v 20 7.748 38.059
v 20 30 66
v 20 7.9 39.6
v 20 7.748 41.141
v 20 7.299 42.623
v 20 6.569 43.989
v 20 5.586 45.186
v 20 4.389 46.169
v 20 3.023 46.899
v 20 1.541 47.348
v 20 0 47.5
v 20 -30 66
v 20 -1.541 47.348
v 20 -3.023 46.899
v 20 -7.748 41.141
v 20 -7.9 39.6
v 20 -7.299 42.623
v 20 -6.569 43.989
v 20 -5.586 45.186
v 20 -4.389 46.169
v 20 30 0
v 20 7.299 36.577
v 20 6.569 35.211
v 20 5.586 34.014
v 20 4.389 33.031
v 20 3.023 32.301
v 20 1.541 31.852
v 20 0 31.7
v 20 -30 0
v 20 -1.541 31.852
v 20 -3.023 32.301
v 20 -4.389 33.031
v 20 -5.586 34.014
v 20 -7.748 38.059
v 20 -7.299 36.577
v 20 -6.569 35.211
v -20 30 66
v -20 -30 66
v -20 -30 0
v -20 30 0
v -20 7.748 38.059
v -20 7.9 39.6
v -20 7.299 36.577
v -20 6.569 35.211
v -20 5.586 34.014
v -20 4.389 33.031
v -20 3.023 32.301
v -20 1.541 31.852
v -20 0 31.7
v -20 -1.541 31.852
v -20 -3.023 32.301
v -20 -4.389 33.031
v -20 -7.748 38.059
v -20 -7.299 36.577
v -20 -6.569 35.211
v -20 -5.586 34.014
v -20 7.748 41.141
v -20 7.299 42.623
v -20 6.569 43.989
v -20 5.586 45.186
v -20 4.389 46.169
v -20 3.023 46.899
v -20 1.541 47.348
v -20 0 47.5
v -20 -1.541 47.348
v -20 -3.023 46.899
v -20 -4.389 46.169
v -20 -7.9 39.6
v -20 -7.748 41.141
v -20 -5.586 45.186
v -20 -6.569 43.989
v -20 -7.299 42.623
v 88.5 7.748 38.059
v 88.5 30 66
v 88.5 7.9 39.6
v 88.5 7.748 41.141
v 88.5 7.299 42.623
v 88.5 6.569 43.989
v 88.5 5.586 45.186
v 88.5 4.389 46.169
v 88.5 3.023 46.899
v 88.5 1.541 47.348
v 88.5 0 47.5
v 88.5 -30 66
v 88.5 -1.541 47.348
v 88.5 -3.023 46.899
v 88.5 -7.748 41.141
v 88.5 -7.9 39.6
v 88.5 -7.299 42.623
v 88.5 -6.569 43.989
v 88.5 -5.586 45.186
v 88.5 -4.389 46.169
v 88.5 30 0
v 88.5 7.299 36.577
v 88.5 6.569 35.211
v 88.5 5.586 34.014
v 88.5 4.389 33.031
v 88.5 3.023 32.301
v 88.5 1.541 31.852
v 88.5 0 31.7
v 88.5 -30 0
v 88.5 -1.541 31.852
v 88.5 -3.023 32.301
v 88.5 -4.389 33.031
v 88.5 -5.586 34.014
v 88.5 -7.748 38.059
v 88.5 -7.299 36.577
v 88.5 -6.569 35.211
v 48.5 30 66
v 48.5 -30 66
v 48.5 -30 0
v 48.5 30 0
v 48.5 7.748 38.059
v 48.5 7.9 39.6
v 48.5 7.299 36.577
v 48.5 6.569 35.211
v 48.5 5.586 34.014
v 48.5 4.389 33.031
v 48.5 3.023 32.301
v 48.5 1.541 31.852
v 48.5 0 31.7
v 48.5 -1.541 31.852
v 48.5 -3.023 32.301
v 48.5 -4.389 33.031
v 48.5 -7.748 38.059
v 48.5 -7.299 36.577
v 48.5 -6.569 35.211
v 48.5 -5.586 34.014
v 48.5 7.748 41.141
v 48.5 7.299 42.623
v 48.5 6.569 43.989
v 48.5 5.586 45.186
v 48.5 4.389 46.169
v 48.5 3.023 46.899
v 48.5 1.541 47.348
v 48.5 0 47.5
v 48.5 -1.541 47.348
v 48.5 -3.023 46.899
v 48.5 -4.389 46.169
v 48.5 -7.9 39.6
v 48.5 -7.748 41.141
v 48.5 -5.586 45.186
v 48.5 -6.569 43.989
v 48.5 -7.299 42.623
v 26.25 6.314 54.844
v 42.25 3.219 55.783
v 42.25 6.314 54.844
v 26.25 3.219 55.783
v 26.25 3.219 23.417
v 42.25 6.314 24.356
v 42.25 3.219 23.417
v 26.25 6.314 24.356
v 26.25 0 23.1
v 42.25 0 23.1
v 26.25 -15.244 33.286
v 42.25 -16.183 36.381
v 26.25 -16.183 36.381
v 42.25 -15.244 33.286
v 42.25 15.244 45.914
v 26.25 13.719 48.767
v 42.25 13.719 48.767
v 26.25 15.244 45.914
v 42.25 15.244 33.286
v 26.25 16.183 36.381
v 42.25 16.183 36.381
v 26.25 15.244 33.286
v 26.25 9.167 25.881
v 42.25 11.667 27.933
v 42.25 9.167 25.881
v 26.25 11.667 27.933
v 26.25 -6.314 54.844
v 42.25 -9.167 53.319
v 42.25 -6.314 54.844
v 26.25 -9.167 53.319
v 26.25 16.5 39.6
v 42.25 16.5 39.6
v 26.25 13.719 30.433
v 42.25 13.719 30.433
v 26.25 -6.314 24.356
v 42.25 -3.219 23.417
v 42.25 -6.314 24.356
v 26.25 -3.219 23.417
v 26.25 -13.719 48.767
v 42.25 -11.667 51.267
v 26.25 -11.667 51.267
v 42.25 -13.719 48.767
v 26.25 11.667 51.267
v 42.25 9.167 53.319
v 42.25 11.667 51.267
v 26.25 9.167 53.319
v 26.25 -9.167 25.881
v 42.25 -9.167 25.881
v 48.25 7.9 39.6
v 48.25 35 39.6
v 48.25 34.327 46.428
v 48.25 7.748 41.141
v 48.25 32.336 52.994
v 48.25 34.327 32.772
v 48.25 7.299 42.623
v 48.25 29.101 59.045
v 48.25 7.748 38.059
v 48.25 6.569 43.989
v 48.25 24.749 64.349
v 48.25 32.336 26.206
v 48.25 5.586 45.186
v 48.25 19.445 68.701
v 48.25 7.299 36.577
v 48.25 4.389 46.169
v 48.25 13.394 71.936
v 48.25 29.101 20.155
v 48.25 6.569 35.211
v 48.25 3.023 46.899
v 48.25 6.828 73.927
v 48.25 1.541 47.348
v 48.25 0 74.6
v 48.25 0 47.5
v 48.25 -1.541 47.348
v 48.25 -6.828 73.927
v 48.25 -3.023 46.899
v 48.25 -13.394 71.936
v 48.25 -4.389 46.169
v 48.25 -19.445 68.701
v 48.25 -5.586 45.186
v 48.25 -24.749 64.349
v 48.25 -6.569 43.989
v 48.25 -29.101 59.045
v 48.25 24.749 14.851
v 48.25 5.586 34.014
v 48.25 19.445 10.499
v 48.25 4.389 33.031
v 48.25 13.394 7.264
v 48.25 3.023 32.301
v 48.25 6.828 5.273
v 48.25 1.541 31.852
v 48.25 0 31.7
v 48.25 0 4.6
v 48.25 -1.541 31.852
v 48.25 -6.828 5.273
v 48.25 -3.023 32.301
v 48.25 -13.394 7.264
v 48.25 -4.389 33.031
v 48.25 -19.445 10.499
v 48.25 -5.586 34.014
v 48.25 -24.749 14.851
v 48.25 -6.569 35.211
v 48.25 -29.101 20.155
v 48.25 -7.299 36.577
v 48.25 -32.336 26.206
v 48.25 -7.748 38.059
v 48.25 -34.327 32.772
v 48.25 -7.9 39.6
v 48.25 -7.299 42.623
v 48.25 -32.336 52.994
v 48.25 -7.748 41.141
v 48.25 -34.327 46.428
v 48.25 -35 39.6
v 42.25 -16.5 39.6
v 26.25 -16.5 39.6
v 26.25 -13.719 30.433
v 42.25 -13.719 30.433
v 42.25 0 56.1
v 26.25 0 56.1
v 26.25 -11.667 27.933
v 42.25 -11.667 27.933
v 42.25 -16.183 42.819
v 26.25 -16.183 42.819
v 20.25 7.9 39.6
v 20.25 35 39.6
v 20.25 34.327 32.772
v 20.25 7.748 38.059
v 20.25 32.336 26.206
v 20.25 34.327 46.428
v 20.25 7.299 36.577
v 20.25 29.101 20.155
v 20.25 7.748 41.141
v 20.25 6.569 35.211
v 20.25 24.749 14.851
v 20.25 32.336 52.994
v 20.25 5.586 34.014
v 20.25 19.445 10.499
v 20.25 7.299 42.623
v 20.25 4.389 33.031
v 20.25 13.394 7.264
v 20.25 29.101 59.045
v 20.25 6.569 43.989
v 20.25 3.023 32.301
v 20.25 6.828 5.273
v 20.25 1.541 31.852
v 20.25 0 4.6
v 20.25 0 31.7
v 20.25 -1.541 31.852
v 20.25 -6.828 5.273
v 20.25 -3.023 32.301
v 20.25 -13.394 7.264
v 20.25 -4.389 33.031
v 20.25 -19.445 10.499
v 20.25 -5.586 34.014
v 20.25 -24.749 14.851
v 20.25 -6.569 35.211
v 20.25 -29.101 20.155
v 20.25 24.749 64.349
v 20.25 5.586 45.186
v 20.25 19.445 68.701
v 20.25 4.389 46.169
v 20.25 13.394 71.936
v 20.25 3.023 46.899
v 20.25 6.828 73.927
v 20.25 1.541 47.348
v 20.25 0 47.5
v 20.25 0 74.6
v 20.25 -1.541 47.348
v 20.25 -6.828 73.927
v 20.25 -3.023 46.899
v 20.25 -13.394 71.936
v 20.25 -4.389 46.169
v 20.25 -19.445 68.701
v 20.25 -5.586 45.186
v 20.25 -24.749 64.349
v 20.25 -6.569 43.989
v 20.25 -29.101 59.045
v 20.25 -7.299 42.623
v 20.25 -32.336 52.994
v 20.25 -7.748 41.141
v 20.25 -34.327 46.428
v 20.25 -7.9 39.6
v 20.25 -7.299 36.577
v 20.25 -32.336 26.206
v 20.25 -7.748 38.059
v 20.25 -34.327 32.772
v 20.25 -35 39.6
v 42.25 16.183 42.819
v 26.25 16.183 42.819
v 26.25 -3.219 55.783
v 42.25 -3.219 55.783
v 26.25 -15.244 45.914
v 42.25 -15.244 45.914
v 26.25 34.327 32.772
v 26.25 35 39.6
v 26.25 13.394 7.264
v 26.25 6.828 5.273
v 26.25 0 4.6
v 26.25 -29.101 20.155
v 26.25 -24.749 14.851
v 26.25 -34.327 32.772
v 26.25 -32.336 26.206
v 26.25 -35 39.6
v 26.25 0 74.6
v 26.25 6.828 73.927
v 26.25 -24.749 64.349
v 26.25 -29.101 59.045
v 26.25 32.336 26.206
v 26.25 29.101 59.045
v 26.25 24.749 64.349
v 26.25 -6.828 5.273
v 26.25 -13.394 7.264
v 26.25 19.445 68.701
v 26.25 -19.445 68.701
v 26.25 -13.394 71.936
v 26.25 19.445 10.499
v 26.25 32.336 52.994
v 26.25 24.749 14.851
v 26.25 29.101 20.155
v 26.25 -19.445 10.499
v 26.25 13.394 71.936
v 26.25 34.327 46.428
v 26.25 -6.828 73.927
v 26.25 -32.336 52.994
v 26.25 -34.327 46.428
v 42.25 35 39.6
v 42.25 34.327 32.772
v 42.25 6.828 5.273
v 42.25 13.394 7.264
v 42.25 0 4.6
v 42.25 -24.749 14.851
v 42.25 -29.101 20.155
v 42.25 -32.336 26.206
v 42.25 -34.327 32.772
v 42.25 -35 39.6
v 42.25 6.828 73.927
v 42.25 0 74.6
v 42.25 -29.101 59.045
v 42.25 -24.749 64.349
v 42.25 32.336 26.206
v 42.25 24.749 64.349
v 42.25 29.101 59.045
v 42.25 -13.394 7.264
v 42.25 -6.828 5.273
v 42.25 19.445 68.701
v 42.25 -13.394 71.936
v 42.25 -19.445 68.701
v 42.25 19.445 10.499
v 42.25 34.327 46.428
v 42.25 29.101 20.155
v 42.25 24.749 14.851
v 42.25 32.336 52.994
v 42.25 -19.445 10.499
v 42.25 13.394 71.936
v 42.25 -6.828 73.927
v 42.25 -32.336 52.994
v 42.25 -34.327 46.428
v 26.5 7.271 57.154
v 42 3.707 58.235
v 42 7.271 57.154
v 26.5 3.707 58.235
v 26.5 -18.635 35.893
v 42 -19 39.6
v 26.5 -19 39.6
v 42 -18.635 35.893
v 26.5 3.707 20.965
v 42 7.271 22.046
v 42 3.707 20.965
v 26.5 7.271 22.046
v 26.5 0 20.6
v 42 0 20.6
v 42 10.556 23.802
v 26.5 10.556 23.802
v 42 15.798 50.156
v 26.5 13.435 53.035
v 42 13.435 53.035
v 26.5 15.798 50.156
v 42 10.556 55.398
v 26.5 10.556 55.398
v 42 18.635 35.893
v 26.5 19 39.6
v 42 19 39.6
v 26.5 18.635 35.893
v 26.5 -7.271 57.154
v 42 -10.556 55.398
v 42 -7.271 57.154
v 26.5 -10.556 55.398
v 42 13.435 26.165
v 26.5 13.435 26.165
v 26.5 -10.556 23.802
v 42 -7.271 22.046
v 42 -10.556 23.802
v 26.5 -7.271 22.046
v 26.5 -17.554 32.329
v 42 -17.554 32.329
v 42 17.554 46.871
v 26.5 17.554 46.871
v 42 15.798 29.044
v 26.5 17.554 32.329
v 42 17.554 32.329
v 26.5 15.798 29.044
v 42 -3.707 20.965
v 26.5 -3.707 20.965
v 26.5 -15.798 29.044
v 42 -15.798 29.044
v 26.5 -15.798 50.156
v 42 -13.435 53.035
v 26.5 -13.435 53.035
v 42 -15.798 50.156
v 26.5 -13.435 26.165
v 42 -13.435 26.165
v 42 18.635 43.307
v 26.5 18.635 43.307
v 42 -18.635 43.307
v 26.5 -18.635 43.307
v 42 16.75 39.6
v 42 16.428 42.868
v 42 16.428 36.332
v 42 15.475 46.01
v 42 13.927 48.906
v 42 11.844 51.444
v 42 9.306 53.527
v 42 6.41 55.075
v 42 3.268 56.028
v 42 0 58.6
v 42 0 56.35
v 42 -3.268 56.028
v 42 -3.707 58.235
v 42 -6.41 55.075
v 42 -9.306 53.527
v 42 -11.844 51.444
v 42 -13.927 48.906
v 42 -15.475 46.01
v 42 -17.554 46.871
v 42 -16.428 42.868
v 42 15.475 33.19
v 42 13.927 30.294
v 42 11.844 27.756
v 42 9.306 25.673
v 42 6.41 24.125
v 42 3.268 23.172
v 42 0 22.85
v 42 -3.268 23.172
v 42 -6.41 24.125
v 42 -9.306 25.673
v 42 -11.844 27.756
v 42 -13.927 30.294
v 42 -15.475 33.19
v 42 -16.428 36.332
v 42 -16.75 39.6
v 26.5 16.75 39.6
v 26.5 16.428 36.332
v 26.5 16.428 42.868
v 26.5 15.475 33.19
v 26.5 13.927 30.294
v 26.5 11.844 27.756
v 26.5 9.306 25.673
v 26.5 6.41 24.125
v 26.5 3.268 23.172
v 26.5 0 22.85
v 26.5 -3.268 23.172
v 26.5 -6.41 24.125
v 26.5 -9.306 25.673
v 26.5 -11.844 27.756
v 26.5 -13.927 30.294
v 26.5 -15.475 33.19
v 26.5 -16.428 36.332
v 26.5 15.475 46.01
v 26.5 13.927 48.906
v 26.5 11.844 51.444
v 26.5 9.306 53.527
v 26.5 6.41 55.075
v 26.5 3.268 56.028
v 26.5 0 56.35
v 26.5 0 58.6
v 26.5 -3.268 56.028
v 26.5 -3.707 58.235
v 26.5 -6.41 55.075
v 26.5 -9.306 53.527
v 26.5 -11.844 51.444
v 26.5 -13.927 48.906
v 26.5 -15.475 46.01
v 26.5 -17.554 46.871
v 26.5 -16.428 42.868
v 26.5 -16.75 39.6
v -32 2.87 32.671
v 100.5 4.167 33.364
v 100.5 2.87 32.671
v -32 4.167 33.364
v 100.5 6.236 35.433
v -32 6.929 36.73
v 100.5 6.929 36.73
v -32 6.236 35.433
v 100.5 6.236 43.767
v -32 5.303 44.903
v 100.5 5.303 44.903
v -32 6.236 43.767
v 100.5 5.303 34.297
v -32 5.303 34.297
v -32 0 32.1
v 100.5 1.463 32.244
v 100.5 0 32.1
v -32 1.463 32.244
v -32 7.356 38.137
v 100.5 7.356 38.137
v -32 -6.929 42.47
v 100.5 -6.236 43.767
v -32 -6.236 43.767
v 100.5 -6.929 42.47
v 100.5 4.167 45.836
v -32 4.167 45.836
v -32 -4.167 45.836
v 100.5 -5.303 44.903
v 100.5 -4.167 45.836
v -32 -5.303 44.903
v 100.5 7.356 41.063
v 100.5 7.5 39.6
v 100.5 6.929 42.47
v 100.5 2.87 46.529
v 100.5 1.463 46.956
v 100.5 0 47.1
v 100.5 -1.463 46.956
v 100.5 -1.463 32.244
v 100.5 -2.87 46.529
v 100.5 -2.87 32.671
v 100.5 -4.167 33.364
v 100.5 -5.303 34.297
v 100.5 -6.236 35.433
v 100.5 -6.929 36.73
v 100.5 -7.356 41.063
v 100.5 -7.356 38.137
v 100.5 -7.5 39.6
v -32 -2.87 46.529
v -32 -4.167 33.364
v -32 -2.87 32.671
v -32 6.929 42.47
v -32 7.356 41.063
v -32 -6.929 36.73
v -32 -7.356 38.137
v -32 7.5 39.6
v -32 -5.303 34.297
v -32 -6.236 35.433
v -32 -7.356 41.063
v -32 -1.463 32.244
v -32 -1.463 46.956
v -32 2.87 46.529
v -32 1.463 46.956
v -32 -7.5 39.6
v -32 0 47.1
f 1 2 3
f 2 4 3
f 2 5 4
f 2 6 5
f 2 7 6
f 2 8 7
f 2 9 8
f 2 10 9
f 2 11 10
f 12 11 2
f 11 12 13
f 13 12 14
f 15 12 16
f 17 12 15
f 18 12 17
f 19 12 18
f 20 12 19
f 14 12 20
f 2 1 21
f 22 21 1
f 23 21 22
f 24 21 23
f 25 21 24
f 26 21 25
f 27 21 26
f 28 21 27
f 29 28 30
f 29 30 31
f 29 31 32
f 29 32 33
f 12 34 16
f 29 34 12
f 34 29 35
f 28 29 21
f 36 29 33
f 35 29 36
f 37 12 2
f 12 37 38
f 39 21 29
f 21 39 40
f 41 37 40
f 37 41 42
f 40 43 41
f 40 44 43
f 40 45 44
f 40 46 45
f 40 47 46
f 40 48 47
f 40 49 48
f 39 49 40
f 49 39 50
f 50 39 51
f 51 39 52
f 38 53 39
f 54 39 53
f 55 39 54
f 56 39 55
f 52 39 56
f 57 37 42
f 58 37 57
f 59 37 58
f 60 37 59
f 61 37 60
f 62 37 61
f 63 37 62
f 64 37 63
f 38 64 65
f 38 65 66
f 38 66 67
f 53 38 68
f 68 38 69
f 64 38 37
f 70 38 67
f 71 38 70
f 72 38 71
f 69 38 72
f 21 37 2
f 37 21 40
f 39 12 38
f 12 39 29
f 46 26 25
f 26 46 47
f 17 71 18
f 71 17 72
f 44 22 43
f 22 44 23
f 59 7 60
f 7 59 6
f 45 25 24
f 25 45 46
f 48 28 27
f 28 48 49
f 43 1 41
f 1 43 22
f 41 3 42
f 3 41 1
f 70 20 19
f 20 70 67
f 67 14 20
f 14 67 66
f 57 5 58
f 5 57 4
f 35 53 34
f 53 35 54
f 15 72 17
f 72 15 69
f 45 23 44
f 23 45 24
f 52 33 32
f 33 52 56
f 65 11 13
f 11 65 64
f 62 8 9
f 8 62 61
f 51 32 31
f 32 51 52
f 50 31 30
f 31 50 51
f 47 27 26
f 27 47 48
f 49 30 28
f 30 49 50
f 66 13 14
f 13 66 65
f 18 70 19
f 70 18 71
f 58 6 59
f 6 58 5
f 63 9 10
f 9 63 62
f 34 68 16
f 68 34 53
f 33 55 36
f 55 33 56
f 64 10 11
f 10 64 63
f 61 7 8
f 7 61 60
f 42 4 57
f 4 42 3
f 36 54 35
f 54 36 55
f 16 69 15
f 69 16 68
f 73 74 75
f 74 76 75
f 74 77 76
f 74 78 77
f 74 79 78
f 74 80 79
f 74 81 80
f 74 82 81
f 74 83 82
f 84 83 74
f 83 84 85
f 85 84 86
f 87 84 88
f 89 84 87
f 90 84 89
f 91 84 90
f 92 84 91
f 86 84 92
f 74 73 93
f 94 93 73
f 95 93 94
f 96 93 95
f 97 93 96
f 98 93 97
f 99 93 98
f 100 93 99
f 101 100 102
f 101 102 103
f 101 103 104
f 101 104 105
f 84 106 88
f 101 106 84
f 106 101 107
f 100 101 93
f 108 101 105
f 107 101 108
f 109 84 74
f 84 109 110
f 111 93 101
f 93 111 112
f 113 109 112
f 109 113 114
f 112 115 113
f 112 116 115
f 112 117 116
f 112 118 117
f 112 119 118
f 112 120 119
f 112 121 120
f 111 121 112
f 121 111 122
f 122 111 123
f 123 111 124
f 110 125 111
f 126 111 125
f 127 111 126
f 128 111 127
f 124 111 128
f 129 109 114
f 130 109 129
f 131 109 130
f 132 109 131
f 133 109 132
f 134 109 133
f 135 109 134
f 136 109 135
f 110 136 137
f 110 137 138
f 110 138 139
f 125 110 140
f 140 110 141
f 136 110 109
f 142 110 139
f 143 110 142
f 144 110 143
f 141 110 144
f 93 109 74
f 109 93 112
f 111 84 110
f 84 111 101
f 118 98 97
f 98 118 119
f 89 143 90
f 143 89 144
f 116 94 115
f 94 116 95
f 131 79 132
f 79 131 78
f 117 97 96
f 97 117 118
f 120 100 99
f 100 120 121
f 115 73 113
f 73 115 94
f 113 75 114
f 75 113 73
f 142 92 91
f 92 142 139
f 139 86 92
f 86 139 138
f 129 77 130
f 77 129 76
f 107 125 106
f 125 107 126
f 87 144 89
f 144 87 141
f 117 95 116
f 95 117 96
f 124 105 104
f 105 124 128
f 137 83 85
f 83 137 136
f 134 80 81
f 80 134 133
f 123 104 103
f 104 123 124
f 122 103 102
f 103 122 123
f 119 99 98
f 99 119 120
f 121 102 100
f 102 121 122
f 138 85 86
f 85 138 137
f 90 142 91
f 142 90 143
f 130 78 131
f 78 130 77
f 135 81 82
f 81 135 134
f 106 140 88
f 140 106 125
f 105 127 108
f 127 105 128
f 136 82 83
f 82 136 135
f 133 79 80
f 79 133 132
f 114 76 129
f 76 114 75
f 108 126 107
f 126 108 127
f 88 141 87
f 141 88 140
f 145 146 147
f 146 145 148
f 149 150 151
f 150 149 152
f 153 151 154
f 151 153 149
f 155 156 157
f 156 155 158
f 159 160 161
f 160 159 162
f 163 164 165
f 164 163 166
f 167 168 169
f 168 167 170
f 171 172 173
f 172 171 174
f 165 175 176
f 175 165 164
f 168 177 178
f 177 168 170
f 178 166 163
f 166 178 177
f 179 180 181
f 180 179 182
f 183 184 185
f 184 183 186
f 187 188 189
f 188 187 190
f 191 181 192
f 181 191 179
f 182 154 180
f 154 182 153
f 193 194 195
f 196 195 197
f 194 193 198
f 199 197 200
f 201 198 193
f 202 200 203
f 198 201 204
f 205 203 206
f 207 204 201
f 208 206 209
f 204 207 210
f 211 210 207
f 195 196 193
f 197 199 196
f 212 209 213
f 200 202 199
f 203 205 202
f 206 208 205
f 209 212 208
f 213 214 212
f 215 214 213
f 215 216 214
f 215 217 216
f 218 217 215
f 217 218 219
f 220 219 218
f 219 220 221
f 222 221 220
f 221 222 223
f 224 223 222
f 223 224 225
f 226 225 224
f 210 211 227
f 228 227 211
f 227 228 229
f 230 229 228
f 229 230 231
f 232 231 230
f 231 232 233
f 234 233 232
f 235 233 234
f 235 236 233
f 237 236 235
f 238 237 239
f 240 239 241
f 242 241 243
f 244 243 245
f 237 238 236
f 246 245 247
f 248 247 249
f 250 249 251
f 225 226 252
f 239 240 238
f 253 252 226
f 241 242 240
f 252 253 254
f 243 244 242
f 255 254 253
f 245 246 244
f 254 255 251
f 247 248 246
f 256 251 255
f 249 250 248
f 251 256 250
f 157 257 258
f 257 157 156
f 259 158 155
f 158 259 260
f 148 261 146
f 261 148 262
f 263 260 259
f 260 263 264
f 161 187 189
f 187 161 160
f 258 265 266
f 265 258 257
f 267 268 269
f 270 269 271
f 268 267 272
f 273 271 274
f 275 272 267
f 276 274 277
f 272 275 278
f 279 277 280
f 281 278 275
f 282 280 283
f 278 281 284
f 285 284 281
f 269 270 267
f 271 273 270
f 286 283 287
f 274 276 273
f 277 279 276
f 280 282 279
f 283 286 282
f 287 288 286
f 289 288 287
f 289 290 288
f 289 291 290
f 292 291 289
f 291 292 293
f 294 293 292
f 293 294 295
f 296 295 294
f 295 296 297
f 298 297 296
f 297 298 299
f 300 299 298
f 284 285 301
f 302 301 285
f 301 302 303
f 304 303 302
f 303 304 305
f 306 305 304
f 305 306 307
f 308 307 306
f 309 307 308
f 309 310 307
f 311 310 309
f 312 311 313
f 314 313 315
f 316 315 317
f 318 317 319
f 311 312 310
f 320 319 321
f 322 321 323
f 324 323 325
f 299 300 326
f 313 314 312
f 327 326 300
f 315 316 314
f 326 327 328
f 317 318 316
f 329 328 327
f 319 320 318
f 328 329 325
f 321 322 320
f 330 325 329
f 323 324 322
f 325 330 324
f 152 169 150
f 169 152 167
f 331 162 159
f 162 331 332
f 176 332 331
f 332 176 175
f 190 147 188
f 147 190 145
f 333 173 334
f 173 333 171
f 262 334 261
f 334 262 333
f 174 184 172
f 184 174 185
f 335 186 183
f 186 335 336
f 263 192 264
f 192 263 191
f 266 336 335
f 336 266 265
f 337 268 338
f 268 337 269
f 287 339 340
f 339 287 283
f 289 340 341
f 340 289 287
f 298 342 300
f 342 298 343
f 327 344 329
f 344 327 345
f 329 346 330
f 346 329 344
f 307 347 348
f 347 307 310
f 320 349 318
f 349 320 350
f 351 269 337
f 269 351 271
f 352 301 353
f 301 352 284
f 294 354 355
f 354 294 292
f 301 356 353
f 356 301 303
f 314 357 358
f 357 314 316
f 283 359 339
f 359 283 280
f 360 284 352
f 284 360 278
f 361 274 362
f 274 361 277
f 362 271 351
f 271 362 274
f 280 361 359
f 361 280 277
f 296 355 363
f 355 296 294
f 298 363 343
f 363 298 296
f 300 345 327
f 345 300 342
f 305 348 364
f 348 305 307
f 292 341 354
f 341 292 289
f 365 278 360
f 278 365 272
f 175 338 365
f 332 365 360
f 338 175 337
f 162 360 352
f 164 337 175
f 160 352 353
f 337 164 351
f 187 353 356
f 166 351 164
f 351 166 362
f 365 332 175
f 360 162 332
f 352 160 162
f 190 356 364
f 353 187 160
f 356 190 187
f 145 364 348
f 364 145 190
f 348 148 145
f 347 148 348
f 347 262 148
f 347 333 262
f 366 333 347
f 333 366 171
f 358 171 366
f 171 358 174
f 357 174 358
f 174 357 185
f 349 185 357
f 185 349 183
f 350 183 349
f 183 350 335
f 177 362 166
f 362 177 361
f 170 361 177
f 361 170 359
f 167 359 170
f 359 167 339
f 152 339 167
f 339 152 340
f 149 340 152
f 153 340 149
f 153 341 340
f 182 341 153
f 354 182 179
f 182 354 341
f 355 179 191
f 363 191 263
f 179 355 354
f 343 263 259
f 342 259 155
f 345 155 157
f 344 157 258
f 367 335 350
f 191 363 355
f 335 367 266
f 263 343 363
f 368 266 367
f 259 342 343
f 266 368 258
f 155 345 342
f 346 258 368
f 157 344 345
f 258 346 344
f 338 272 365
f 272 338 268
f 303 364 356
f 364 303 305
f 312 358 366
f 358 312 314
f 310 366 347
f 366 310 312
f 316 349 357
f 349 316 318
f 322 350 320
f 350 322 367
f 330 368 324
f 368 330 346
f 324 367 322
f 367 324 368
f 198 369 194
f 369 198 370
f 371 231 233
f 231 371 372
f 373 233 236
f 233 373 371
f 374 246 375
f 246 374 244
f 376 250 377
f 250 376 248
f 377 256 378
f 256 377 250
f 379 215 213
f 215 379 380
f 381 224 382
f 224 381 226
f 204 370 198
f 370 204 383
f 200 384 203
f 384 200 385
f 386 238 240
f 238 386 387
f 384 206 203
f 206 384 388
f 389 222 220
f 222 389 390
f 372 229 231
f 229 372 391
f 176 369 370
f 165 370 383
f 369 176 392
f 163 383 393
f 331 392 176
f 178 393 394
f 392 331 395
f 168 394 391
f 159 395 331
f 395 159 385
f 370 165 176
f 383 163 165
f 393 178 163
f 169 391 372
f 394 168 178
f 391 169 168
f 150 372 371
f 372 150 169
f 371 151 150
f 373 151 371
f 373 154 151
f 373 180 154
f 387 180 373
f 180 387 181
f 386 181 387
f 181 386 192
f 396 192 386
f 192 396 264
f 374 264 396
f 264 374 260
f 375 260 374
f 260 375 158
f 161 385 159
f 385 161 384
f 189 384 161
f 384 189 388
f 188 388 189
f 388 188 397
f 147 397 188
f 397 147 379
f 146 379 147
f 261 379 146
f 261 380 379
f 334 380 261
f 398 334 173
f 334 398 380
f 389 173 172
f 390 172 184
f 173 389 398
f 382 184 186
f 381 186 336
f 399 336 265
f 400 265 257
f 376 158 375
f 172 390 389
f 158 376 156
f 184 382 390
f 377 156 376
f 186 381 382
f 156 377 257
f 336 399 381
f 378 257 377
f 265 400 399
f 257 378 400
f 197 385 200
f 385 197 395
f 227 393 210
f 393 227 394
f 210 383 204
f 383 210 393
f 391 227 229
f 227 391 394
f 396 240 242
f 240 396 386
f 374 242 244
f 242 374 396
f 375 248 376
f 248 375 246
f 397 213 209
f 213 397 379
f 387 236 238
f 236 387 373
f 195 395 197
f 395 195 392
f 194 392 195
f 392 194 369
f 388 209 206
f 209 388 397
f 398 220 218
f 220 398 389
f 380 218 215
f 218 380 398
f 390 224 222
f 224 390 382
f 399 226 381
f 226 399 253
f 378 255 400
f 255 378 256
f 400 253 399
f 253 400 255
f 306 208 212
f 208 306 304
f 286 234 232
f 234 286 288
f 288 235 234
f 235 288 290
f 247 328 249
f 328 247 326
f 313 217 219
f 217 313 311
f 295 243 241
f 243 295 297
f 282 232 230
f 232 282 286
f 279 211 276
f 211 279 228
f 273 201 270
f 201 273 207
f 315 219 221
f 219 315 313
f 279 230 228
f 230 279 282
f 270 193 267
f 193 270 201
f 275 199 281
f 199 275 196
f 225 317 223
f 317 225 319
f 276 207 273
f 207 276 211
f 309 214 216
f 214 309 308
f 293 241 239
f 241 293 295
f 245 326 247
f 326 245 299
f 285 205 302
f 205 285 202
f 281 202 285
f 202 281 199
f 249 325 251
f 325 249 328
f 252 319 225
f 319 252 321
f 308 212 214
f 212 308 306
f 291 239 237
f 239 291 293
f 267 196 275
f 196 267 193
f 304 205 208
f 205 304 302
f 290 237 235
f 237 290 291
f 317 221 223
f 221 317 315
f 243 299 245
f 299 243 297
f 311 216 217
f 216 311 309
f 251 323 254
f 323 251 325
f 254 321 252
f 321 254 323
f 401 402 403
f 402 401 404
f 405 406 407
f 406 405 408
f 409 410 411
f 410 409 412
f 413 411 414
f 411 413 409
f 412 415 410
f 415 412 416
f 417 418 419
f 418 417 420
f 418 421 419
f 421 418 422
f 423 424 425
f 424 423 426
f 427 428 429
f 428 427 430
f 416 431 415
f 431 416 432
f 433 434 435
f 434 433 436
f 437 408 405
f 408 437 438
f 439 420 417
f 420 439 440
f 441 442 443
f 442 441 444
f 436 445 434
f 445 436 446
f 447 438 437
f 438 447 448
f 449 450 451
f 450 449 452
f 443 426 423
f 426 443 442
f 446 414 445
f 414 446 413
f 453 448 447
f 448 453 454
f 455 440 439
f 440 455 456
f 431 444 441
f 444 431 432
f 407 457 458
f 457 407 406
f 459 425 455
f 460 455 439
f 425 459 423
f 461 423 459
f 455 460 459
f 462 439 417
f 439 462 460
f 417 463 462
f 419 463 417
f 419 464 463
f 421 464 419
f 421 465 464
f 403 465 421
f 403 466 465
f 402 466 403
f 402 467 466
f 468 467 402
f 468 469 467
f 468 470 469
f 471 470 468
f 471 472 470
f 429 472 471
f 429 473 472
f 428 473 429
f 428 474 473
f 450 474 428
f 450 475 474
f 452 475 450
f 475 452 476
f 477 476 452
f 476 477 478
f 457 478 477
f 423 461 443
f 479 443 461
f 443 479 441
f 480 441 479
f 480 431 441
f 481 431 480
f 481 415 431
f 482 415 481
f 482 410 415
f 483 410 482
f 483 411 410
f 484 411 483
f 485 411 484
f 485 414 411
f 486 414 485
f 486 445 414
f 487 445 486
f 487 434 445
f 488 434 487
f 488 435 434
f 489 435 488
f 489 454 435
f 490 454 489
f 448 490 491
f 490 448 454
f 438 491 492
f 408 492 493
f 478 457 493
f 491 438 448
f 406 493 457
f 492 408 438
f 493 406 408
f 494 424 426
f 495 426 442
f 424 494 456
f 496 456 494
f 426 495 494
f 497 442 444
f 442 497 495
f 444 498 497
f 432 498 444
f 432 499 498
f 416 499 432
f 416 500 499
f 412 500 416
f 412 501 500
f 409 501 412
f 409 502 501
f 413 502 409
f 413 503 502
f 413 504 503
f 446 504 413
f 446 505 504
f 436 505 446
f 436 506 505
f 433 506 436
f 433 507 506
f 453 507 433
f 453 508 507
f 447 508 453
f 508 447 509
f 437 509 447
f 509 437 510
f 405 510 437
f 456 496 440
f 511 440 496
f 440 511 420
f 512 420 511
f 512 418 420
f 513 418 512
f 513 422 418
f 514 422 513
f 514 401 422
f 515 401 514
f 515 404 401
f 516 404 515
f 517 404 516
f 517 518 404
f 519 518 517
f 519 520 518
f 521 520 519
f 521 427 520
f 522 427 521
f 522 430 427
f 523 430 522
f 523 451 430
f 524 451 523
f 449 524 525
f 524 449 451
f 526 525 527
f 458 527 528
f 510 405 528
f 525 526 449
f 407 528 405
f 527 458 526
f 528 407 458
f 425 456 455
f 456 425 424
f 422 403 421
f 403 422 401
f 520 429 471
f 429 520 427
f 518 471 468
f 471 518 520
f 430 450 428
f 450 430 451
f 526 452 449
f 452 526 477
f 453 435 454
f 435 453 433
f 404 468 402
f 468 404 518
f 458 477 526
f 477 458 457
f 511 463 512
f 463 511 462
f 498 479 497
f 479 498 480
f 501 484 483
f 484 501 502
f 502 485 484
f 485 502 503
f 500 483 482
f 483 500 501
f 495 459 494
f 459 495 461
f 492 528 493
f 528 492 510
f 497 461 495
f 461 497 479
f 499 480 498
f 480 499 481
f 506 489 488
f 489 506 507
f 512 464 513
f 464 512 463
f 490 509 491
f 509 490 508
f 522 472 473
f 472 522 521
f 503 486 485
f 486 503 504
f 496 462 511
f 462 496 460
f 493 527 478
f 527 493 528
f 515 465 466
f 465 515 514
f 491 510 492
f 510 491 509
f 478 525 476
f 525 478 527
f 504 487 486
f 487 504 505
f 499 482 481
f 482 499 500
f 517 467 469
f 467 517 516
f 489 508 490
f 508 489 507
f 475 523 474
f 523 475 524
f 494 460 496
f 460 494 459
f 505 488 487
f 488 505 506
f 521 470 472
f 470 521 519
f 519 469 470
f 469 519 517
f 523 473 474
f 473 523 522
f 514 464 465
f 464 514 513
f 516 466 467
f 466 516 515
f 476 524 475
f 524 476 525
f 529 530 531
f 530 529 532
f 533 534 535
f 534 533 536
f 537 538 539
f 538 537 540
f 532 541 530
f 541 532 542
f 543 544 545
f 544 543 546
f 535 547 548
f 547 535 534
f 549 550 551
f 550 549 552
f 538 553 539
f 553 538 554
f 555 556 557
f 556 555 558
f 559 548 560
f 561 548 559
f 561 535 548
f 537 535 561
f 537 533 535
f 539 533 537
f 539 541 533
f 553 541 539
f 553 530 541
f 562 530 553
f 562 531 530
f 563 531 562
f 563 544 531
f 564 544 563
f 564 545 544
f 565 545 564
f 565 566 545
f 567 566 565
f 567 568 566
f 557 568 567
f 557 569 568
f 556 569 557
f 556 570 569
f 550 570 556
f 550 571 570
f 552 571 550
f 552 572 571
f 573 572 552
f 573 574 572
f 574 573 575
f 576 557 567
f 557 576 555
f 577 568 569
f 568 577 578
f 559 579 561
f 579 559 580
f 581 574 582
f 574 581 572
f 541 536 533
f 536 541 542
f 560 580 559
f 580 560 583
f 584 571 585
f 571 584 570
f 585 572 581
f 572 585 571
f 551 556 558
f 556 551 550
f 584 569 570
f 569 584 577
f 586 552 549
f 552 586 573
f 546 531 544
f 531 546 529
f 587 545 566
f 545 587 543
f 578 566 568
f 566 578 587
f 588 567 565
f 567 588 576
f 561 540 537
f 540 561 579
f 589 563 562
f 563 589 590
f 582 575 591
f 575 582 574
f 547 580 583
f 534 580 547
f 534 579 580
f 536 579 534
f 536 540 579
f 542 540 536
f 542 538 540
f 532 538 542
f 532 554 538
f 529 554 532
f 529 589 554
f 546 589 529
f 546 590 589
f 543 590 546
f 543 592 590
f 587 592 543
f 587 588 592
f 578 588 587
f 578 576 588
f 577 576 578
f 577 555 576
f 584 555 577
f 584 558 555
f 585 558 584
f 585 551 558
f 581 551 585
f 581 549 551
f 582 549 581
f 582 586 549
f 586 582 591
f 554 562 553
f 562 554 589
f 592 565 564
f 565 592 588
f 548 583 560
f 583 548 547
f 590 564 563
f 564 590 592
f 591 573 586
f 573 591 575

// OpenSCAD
$fn = 32;

// ------------------------------------------------------------------------
// Pulley assembly: d70 pulley with a belt, shaft d15
// Every part is its own module, assembly() places them once.
// ------------------------------------------------------------------------

// --- part 1 ---
module support1() {
  difference() {
    translate([-20, -30, 0]) cube([40, 60, 66]);
    translate([0, 0, 39.6]) rotate([0, 90, 0]) cylinder(h = 42, d = 15.8, center = true);
  }
}

// --- part 2 ---
module support2() {
  difference() {
    translate([-20, -30, 0]) cube([40, 60, 66]);
    translate([0, 0, 39.6]) rotate([0, 90, 0]) cylinder(h = 42, d = 15.8, center = true);
  }
}

// --- part 3 ---
module shaft() {
  translate([0, 0, -66.25]) cylinder(h = 132.5, d = 15);
}

// --- part 4 ---
module pulley() {
  difference() {
    union() {
      cylinder(h = 28, d = 33);
      cylinder(h = 6, d = 70);
      translate([0, 0, 22]) cylinder(h = 6, d = 70);
    }
    translate([0, 0, -1]) cylinder(h = 30, d = 15.8);
  }
}

// --- part 5 ---
module belt() {
  difference() {
      translate([0, 0, 0]) cylinder(h = 15.5, d = 38);
      translate([0, 0, -1]) cylinder(h = 17.5, d = 33.5);
    }
}

// --- assembly ---
module assembly() {
  translate([0, 0, 0]) rotate([0, 0, 0]) support1();
  translate([68.5, 0, 0]) rotate([0, 0, 0]) support2();
  translate([34.25, 0, 39.6]) rotate([0, 90, 0]) shaft();
  translate([20.25, 0, 39.6]) rotate([0, 90, 0]) pulley();
  translate([26.5, 0, 39.6]) rotate([0, 90, 0]) belt();
}

assembly();
